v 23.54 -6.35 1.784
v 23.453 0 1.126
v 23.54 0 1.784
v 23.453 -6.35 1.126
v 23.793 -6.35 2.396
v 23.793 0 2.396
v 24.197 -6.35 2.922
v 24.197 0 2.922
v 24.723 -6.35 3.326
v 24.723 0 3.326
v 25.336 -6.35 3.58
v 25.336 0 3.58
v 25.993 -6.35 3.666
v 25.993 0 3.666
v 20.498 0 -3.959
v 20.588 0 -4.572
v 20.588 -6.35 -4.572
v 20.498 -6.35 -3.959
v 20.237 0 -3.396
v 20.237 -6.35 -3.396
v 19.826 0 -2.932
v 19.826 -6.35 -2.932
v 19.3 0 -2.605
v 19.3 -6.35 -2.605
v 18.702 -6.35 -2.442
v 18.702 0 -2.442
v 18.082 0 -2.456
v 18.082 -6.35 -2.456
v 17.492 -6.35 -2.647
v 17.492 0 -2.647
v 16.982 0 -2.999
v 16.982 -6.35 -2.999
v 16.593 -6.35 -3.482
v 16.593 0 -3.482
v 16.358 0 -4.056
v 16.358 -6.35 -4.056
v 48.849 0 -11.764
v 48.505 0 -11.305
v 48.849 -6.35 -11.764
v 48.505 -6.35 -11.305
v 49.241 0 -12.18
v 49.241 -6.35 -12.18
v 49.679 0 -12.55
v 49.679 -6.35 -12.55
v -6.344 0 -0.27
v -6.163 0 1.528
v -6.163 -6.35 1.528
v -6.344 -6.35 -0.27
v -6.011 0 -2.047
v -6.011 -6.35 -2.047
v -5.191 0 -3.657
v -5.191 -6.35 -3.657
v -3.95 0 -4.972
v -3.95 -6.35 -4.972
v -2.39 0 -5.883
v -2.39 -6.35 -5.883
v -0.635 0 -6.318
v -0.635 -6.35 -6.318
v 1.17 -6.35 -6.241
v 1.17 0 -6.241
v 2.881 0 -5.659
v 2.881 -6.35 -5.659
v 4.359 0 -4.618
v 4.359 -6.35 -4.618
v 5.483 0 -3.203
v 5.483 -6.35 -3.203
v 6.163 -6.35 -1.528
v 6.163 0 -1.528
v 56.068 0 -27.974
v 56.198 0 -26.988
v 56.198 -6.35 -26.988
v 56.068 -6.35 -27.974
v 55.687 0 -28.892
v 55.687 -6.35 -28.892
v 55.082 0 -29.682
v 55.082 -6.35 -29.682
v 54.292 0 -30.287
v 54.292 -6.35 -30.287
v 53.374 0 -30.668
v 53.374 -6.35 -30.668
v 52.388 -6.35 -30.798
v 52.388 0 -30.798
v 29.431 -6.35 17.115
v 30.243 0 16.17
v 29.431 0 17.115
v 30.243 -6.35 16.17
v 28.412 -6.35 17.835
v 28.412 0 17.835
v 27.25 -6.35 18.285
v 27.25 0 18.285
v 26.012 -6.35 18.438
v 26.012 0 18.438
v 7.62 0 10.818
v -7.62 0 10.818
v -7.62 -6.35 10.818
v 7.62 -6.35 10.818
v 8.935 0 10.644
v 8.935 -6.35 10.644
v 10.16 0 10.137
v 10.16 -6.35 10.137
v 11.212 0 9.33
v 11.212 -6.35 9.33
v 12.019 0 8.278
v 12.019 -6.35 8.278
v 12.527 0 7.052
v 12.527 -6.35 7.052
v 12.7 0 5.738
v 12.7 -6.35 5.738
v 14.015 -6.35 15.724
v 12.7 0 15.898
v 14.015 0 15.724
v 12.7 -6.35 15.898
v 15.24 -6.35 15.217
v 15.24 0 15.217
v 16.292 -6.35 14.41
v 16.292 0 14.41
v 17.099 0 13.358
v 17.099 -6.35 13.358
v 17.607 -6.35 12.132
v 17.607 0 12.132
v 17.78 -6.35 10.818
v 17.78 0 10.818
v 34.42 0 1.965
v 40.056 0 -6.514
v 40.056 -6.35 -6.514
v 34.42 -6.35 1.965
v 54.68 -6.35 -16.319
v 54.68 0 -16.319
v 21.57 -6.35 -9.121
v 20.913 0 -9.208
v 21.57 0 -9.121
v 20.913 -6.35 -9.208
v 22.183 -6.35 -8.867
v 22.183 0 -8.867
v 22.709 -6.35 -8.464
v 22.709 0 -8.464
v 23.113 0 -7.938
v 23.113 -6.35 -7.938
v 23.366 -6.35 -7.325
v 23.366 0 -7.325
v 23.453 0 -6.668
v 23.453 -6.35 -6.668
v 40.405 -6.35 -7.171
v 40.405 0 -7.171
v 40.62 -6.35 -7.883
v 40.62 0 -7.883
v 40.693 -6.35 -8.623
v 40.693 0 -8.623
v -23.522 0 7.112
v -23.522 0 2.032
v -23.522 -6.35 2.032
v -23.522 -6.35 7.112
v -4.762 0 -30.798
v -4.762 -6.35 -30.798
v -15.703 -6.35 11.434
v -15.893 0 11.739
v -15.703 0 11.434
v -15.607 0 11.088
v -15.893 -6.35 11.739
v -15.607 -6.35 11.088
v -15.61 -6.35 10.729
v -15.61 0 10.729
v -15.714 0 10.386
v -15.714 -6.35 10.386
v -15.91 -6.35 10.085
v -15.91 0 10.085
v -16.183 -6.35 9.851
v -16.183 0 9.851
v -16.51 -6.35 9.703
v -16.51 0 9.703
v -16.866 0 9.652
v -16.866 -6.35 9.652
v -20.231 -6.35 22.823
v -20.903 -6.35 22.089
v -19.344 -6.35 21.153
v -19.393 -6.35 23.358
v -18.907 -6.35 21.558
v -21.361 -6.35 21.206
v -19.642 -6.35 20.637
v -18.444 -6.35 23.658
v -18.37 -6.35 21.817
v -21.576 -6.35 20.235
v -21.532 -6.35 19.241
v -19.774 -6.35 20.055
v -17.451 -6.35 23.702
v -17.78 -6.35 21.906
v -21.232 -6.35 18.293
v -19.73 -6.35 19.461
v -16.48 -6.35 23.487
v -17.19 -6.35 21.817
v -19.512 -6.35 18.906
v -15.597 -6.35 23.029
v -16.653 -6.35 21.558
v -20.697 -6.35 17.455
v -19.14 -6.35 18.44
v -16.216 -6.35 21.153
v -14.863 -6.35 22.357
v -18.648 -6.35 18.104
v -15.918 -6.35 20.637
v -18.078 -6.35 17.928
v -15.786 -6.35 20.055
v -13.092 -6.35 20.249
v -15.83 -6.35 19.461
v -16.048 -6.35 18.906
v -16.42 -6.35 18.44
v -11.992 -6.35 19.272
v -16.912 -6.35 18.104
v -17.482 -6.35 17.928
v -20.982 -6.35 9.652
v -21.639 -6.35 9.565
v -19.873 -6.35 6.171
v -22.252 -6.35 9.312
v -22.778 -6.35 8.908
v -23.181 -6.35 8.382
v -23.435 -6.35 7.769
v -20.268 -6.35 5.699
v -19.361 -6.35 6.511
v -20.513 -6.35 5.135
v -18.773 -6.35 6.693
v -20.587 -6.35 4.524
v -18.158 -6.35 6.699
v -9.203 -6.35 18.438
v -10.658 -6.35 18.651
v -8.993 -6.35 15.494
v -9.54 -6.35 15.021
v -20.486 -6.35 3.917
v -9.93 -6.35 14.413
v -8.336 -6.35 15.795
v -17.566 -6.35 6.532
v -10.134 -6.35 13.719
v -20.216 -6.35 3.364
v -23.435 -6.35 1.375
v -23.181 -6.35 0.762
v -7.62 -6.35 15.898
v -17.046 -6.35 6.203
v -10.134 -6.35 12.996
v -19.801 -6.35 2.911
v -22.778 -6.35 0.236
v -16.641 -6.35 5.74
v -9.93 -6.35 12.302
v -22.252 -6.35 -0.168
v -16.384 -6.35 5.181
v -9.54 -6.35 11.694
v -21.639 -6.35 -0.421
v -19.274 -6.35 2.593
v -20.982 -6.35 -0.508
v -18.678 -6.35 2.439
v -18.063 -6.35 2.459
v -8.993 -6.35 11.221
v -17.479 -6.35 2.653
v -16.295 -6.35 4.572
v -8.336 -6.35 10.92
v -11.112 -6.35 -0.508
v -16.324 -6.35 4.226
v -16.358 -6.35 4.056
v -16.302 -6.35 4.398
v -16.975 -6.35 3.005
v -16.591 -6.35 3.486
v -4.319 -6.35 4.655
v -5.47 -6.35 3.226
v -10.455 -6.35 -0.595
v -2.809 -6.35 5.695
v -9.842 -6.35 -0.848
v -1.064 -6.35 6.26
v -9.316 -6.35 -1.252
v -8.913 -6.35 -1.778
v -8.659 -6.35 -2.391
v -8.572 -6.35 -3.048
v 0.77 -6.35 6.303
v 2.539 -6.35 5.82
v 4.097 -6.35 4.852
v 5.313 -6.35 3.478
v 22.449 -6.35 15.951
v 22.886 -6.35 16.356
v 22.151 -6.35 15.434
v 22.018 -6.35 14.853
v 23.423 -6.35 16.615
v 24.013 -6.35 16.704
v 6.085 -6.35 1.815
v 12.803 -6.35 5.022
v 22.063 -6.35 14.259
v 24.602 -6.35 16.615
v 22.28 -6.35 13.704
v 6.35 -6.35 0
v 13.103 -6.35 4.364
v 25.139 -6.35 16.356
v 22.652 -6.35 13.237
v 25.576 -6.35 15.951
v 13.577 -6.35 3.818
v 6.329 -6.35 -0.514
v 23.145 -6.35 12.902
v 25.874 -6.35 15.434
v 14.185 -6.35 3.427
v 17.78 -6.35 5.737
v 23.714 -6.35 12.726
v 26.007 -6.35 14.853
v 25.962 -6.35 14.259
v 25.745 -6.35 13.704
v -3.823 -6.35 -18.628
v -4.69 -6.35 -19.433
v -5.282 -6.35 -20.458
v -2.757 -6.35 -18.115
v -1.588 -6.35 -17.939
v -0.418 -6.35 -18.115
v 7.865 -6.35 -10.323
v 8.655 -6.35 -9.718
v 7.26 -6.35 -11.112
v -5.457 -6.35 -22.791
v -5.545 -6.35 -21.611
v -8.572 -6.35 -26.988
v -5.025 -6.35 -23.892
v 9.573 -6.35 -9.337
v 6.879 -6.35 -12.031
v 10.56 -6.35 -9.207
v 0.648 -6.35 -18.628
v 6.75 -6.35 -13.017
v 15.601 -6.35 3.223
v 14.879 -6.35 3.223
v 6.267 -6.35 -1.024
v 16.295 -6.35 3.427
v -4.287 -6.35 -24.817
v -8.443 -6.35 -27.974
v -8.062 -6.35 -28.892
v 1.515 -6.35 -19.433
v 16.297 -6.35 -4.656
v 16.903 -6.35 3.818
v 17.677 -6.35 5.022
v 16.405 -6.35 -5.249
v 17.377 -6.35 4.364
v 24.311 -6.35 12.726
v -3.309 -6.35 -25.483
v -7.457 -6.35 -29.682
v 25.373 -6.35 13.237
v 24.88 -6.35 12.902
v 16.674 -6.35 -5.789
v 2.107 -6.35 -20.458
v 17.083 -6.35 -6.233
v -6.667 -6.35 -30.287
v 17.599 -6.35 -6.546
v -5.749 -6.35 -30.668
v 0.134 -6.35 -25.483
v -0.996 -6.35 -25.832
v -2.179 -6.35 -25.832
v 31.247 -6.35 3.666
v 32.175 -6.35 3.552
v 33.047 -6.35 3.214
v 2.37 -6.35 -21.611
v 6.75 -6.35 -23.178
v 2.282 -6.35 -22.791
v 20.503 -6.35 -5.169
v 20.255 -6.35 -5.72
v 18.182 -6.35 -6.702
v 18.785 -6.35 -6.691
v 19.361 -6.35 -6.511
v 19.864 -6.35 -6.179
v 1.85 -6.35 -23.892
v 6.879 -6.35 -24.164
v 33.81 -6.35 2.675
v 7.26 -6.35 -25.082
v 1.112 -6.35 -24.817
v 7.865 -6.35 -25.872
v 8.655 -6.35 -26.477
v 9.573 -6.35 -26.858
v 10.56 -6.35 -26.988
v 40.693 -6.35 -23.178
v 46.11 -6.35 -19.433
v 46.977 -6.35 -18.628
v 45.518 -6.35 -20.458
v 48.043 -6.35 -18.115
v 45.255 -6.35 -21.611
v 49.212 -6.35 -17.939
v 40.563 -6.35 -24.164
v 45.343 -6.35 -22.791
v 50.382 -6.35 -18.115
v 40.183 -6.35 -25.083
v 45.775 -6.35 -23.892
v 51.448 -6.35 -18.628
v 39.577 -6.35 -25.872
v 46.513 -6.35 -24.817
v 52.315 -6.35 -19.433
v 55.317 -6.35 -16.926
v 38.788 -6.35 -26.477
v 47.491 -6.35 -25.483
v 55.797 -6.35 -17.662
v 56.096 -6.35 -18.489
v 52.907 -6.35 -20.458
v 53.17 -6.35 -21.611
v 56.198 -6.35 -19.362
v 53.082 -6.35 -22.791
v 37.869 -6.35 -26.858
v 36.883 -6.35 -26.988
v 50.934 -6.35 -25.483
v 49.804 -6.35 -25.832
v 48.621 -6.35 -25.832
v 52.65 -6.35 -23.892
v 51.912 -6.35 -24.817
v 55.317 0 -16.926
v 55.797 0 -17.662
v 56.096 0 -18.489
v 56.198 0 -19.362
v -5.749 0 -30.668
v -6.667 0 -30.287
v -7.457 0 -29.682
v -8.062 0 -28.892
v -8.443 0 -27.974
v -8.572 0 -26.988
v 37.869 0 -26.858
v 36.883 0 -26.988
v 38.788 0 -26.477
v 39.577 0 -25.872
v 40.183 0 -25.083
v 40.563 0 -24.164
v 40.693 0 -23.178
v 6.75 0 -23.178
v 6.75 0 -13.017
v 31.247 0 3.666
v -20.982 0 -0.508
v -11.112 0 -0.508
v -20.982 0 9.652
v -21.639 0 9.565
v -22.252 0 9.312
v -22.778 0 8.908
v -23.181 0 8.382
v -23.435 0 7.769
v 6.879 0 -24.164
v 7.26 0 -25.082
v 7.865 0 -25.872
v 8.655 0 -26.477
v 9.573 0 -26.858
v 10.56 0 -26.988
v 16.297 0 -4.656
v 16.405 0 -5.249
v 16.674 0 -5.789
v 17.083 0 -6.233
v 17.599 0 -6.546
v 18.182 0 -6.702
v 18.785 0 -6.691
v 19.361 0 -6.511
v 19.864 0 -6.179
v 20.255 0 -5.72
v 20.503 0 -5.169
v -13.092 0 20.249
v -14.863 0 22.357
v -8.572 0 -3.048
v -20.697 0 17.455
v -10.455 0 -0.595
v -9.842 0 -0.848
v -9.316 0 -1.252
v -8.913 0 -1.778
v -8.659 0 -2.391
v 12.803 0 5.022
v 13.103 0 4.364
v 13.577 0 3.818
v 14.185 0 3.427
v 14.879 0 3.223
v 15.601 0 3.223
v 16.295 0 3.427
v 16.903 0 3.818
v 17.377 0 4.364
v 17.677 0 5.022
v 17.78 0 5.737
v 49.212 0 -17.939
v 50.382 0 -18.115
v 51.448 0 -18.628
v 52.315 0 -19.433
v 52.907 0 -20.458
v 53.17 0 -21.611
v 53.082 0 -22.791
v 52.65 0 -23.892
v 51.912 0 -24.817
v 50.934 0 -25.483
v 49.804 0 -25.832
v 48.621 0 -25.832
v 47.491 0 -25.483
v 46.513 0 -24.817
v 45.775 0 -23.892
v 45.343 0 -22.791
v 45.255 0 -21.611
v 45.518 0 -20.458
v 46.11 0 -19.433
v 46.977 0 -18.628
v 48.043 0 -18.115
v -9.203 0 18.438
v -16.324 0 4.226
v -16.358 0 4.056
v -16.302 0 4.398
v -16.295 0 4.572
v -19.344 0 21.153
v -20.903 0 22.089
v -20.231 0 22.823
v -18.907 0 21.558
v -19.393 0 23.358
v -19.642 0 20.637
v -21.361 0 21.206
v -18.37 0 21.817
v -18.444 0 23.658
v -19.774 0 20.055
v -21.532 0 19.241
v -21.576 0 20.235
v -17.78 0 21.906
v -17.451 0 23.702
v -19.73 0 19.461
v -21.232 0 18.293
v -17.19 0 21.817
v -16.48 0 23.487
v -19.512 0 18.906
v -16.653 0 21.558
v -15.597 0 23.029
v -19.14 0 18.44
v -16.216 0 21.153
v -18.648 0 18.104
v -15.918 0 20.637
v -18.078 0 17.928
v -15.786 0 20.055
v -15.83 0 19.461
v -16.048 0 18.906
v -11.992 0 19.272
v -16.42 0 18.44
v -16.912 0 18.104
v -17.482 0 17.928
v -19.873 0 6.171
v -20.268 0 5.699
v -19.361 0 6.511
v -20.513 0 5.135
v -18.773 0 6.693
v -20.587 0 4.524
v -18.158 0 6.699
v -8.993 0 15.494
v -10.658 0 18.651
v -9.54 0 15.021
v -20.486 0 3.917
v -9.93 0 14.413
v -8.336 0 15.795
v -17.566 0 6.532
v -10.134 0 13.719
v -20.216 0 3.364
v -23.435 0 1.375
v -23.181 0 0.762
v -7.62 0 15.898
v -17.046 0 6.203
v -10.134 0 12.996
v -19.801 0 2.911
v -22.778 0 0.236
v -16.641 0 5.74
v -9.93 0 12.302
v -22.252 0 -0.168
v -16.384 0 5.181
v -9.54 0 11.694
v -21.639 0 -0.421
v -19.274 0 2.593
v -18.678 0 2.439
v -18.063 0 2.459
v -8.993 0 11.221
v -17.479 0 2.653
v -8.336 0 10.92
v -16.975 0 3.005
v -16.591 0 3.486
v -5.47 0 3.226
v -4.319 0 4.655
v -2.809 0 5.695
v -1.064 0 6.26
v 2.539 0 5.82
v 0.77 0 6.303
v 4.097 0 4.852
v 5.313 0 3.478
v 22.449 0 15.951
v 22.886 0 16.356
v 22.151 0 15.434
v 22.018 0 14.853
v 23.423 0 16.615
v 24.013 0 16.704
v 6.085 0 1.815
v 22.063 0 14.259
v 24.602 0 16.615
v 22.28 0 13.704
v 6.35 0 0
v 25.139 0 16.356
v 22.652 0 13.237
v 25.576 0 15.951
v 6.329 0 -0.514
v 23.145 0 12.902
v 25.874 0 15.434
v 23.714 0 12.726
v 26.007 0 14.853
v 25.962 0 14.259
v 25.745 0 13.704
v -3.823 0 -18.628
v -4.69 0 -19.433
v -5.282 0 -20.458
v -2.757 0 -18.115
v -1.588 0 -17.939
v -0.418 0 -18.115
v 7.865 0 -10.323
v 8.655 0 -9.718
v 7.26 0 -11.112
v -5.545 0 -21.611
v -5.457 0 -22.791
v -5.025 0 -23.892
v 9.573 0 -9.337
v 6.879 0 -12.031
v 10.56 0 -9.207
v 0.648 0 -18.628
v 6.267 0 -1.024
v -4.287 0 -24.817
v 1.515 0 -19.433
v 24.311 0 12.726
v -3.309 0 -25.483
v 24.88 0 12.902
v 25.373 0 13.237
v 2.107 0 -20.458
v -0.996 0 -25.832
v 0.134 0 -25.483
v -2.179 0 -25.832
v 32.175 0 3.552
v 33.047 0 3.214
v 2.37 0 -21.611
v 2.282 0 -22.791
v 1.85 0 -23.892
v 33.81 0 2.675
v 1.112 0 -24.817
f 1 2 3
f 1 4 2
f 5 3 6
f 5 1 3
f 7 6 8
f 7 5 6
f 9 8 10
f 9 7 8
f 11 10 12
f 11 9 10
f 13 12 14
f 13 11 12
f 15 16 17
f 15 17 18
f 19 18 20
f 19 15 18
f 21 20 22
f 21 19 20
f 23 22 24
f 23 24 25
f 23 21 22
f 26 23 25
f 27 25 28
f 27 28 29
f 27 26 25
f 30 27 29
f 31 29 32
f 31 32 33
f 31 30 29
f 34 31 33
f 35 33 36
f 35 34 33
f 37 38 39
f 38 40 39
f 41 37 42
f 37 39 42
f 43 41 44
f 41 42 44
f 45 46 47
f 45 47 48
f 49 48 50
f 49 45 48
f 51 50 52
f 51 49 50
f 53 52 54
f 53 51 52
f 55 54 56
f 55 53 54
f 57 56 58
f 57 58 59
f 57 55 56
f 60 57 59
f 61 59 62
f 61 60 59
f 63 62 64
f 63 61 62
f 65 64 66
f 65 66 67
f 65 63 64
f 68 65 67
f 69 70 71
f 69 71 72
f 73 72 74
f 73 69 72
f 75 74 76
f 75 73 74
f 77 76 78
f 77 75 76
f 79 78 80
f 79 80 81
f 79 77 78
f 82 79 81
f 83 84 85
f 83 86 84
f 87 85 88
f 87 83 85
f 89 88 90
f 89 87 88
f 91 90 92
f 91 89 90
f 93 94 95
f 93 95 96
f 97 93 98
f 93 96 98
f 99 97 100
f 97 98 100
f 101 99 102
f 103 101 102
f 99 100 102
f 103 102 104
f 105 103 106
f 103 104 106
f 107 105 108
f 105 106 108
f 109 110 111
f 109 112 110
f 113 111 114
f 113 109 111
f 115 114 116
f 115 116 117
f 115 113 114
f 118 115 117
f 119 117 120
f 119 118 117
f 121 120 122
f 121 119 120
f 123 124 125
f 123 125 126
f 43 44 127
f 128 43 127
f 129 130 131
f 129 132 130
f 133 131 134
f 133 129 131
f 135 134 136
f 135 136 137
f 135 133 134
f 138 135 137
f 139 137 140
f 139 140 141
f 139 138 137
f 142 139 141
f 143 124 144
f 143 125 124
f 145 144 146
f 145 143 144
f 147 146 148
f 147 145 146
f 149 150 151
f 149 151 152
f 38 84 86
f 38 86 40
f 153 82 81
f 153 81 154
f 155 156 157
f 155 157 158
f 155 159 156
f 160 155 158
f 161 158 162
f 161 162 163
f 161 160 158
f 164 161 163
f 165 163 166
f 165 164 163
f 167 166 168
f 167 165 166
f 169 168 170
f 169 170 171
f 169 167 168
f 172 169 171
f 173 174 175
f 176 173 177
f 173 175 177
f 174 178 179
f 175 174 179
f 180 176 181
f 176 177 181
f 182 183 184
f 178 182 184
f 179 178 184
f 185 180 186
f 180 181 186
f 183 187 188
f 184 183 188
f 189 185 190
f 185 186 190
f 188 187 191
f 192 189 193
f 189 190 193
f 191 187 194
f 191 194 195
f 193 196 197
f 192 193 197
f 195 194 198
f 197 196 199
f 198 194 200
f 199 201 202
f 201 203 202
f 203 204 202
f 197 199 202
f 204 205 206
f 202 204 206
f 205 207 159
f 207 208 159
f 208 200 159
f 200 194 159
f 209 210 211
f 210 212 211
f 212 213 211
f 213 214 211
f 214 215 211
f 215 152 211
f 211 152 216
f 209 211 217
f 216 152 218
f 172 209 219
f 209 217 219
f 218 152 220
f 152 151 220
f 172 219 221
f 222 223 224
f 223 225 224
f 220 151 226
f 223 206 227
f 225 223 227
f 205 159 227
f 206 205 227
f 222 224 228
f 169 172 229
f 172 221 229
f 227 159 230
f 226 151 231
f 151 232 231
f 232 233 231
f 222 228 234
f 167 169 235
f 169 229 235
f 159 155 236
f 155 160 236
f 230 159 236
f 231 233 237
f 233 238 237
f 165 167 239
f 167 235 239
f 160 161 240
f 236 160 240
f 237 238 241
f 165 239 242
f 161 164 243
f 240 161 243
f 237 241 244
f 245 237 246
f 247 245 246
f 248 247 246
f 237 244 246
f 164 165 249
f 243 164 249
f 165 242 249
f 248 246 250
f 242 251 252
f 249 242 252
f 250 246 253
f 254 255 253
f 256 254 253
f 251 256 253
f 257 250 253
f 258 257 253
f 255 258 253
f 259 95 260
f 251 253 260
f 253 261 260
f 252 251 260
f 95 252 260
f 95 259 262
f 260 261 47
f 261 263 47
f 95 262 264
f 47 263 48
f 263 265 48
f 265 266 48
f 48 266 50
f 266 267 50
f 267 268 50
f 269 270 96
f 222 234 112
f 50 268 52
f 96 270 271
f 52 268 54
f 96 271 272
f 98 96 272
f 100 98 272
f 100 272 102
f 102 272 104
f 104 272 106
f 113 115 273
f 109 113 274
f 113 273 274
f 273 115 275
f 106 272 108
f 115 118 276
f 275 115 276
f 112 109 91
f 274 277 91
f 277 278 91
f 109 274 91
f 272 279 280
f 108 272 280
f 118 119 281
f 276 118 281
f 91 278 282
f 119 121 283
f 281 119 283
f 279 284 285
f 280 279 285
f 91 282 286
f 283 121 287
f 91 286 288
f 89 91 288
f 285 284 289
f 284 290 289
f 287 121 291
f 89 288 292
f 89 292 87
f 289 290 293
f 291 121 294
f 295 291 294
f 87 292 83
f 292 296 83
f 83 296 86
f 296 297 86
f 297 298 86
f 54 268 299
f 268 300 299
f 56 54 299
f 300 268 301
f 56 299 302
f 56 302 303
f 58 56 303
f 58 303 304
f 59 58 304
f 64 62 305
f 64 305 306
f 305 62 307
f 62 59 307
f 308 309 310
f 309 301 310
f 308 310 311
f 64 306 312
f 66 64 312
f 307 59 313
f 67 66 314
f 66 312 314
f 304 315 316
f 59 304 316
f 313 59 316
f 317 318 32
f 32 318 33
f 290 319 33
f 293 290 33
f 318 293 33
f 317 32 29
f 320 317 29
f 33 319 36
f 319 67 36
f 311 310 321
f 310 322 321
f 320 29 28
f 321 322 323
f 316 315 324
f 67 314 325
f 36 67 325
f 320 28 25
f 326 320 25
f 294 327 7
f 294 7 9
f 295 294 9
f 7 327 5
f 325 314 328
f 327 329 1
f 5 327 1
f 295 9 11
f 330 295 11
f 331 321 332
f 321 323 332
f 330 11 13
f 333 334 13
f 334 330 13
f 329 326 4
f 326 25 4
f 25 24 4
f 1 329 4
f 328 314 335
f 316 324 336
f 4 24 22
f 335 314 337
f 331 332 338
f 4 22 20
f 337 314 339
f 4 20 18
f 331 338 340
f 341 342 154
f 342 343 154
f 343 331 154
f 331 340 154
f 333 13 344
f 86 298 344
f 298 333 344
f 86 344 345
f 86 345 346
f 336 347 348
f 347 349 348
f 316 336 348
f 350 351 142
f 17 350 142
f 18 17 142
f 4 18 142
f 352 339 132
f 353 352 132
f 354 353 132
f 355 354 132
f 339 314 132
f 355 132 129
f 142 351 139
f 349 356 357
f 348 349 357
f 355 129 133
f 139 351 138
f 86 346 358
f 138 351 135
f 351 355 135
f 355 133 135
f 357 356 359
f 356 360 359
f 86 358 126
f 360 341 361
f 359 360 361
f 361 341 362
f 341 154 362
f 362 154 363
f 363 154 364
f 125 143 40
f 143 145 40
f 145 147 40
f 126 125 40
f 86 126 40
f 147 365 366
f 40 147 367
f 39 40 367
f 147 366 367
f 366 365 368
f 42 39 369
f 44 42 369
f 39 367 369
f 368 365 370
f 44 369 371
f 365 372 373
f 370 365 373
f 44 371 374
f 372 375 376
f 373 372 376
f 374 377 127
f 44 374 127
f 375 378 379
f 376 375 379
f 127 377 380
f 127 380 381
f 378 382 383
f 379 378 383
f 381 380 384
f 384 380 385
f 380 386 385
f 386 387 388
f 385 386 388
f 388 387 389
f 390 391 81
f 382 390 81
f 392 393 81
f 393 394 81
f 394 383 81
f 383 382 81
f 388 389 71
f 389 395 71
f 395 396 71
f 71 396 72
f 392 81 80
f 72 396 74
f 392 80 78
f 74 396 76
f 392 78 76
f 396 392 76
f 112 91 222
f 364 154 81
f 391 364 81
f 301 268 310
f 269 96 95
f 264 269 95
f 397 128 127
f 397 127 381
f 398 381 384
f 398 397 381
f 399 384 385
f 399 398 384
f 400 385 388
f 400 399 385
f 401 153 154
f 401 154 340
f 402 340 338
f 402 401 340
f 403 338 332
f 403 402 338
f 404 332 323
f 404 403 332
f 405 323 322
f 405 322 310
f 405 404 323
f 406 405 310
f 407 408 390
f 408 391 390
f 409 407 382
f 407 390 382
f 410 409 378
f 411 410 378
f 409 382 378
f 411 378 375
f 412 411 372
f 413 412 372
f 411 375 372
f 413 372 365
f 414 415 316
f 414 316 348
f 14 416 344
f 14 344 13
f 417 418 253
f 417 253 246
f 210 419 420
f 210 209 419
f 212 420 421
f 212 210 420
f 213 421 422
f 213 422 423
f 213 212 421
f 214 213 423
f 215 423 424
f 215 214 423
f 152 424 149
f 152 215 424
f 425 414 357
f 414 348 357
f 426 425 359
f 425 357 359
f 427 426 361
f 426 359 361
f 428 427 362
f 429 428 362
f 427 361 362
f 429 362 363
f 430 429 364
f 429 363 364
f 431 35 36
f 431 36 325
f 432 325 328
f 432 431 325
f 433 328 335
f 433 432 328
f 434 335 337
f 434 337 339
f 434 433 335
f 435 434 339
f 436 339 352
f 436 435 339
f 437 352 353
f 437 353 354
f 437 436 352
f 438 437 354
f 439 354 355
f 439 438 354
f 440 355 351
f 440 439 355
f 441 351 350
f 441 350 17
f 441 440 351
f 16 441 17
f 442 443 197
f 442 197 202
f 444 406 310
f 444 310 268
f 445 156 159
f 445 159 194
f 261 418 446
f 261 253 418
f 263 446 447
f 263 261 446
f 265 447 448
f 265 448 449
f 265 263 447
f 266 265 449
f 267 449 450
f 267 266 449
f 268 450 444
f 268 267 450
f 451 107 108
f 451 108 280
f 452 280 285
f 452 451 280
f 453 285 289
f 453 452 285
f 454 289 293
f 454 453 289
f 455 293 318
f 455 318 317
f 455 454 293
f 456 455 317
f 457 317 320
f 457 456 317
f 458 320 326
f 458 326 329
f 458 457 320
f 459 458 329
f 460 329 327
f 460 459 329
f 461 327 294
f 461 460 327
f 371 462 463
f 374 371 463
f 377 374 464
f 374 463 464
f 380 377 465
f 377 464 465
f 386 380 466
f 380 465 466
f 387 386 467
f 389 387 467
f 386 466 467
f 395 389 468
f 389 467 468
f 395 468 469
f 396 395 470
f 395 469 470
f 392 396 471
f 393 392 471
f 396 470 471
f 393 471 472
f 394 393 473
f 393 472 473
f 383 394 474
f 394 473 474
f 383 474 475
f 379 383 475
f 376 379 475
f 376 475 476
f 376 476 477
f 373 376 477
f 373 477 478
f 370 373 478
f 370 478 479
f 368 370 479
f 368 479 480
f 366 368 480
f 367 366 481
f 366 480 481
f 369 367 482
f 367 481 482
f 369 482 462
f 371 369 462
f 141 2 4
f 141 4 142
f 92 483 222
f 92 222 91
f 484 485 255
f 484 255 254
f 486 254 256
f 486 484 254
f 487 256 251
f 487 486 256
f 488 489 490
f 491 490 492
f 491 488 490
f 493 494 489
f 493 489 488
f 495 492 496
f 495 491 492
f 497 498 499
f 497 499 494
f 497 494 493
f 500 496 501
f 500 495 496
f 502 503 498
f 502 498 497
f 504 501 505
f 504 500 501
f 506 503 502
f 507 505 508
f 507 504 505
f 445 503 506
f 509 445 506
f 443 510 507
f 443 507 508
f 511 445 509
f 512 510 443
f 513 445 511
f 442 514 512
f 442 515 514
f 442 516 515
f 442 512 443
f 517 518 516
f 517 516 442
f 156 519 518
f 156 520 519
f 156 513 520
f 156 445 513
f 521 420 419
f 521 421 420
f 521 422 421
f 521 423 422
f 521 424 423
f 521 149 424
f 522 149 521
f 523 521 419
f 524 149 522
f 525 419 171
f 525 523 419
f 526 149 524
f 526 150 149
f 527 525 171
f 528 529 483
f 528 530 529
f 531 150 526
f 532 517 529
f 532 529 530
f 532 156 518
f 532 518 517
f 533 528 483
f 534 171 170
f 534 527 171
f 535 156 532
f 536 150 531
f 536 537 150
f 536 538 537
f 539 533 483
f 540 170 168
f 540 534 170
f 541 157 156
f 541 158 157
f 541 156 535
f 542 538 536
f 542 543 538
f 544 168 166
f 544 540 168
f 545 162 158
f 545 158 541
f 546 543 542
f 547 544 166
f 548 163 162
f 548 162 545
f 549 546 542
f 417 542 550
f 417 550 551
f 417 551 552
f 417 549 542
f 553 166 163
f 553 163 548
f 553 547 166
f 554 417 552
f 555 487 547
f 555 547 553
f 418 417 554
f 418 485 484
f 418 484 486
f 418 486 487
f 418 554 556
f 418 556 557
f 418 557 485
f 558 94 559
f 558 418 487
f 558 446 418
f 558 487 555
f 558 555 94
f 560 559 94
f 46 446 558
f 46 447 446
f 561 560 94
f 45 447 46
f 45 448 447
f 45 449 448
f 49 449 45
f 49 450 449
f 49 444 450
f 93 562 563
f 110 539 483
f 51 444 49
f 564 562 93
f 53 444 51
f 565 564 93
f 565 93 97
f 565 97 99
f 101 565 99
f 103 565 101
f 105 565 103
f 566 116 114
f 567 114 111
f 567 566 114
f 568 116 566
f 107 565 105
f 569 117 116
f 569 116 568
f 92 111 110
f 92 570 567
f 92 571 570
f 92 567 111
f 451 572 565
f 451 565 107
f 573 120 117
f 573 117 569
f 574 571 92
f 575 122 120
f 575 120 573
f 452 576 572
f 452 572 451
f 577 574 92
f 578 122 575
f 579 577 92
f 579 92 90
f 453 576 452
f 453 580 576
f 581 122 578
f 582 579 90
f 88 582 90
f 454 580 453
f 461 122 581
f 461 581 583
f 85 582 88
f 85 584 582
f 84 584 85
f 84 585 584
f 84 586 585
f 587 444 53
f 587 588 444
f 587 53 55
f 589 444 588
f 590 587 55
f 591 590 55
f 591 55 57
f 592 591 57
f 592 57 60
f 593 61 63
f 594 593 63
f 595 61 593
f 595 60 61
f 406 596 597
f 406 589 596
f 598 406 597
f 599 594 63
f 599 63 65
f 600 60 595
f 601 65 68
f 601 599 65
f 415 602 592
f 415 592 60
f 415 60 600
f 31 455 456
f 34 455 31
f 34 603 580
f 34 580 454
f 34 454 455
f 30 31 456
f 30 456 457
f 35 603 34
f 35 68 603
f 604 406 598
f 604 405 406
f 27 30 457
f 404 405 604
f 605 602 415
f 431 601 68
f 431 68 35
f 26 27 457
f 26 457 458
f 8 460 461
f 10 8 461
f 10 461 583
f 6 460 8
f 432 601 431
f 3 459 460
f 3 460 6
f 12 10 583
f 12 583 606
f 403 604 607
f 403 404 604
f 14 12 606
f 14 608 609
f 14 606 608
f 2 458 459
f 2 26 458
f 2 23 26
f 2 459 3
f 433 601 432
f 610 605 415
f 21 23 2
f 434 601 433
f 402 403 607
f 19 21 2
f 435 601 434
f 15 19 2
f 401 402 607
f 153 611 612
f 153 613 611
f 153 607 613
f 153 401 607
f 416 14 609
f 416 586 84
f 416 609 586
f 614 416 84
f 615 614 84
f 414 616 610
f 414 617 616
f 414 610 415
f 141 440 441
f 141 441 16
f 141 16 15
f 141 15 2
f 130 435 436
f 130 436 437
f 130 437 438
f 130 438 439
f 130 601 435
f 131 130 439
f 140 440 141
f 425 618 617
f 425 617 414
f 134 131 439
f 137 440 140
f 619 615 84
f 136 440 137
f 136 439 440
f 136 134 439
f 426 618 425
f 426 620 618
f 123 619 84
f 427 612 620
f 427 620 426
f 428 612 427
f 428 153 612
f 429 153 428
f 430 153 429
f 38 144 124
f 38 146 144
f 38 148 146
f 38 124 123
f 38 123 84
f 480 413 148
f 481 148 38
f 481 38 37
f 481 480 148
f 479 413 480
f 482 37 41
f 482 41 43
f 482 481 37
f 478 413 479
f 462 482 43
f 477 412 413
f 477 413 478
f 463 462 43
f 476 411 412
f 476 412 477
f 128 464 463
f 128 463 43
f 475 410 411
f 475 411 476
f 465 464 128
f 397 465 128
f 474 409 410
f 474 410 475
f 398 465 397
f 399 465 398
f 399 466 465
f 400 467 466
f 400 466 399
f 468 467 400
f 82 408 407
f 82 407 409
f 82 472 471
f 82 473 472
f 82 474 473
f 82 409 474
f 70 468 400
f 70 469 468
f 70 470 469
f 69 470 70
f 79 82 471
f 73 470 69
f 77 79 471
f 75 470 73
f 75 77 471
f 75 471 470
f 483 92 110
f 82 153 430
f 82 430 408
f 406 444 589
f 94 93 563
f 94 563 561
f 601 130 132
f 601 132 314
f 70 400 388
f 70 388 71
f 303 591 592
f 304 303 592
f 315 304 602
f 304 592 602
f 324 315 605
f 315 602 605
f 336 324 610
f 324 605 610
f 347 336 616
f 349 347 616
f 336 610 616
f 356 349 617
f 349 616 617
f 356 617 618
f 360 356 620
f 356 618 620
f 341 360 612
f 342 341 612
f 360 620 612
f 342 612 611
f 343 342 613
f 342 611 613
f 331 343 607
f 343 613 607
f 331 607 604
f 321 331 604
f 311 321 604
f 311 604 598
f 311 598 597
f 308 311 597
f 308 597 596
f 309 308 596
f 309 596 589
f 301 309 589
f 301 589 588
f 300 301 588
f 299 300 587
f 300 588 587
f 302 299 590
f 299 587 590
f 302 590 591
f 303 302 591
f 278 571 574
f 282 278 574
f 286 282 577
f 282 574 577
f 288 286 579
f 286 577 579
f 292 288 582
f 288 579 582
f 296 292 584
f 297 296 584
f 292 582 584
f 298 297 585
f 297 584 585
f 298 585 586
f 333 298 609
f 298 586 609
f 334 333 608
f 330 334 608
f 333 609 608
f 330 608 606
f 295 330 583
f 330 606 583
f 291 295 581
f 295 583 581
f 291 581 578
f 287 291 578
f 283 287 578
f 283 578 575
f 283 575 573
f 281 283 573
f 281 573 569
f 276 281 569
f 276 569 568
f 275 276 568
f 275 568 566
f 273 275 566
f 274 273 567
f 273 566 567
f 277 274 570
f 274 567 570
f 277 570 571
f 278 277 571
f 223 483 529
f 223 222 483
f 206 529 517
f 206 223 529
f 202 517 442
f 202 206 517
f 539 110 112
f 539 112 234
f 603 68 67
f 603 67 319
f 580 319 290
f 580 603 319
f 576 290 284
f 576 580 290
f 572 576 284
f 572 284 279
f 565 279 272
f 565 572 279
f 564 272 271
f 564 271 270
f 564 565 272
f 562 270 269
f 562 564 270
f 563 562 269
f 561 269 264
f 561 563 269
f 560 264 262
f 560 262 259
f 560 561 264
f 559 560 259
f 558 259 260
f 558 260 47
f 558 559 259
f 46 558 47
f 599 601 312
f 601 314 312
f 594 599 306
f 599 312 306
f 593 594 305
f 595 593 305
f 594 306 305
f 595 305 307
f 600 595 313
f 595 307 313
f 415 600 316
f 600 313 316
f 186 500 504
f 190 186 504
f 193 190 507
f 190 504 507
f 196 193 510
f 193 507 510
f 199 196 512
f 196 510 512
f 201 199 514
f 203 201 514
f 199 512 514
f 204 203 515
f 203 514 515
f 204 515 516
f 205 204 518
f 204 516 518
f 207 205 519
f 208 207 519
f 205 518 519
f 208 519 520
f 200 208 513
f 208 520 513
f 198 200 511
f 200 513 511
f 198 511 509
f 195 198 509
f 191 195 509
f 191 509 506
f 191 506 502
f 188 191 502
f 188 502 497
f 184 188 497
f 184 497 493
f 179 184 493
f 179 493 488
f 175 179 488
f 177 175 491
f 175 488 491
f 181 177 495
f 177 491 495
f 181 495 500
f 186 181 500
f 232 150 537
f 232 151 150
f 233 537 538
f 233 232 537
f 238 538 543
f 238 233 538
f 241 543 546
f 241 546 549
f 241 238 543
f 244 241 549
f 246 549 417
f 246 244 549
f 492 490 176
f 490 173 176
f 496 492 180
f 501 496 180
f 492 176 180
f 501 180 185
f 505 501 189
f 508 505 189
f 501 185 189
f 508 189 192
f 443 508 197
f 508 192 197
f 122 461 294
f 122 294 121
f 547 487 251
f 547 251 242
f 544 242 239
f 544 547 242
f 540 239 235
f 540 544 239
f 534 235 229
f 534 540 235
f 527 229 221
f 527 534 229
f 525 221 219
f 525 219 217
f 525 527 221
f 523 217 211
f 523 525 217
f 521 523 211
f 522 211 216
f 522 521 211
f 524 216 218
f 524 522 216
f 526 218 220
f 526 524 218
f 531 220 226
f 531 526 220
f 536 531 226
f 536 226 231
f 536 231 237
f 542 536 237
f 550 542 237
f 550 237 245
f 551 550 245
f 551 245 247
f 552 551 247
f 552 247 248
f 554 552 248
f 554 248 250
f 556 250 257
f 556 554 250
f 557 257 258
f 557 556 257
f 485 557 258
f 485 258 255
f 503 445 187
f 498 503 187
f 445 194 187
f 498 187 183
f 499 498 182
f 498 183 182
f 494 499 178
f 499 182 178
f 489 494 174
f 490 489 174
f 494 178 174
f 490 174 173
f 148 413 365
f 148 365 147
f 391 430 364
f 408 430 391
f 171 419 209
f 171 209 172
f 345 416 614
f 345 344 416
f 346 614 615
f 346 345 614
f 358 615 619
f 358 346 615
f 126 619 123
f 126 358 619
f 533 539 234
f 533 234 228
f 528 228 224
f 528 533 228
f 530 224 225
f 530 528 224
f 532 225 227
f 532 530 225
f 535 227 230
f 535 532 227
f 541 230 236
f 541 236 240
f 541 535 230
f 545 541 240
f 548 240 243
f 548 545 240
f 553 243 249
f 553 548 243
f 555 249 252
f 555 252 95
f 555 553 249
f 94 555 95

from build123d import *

# Parameters (mm, degrees)
SKETCH4_R           = 2
SKETCH4_R_2         = 3.96875
BOSS_EXTRUDE2_DEPTH = 6.35
FILLET1_R           = 5.08
FILLET7_R           = 3.81
FILLET9_R           = 5.08
FILLET10_R          = 1.27
FILLET11_R          = 3.81
FILLET12_R          = 2.54
FILLET13_R          = 3.81


with BuildPart() as part:
    # Sketch4 → Boss-Extrude2 (new body)
    with BuildSketch(Plane(origin=(0, 0, 0), x_dir=(1, 0, 0), z_dir=(0, 1, 0))):
        with BuildLine():
            Line((22.483900583, -18.4375), (28.735494078, -18.4375))
            Line((28.735494078, -18.4375), (48.985566477, 12.027918285))
            Line((48.985566477, 12.027918285), (54.680415238, 16.319294633))
            ThreePointArc((54.680415238, 16.319294633), (55.797199918, 17.662082259), (56.1975, 19.362095927))
            Line((56.1975, 19.362095927), (56.1975, 26.9875))
            ThreePointArc((56.1975, 26.9875), (55.081576836, 29.681576836), (52.3875, 30.7975))
            Line((52.3875, 30.7975), (-4.7625, 30.7975))
            ThreePointArc((-4.7625, 30.7975), (-7.456576836, 29.681576836), (-8.5725, 26.9875))
            Line((-8.5725, 26.9875), (-8.5725, 12.607500122))
            Line((-8.5725, 12.607500122), (-8.5725, 0.508))
            Line((-8.5725, 0.508), (-23.52171402, 0.508))
            Line((-23.52171402, 0.508), (-23.52171402, -9.652))
            Line((-23.52171402, -9.652), (-14.139296969, -9.652))
            Line((-14.139296969, -9.652), (-23.148009155, -20.371437257))
            Line((-23.148009155, -20.371437257), (-17.314513469, -25.273959881))
            Line((-17.314513469, -25.273959881), (-11.569090649, -18.4375))
            Line((-11.569090649, -18.4375), (22.483900583, -18.4375))
        make_face()
        with Locations(Location((-17.78, -19.905950726, 0), (0, 0, 270))):
            Circle(SKETCH4_R, mode=Mode.SUBTRACT)
        with BuildLine():
            ThreePointArc((-16.29541402, -4.572), (-20.572189245, -4.832151892), (-16.358479767, -4.055532442))
            ThreePointArc((-16.358479767, -4.055532442), (-16.311238795, -4.311848108), (-16.29541402, -4.572))
        make_face(mode=Mode.SUBTRACT)
        with BuildLine():
            ThreePointArc((-7.62, -15.8975), (-10.16, -13.3575), (-7.62, -10.8175))
            Line((-7.62, -10.8175), (12.7, -10.8175))
            Line((12.7, -10.8175), (12.7, -5.7375))
            ThreePointArc((12.7, -5.7375), (15.24, -3.1975), (17.78, -5.7375))
            Line((17.78, -5.7375), (17.78, -13.3575))
            Line((17.78, -13.3575), (17.78, -15.8975))
            Line((17.78, -15.8975), (15.24, -15.8975))
            Line((15.24, -15.8975), (-7.62, -15.8975))
        make_face(mode=Mode.SUBTRACT)
        with BuildLine():
            ThreePointArc((-6.163414949, -1.528010526), (-1.528010526, 6.163414949), (6.163414949, 1.528010526))
            ThreePointArc((6.163414949, 1.528010526), (6.303181138, 0.769680153), (6.35, 0))
            ThreePointArc((6.35, 0), (0.769680153, -6.303181138), (-6.163414949, -1.528010526))
        make_face(mode=Mode.SUBTRACT)
        with Locations(Location((24.012521227, -14.703599027, 0), (0, 0, 270))):
            Circle(SKETCH4_R, mode=Mode.SUBTRACT)
        with Locations(Location((-1.5875, 21.9075, 0), (0, 0, 270))):
            Circle(SKETCH4_R_2, mode=Mode.SUBTRACT)
        with BuildLine():
            ThreePointArc((20.58801402, 4.572), (18.701865912, 2.441524775), (16.358479767, 4.055532442))
            ThreePointArc((16.358479767, 4.055532442), (18.181562129, 6.702475225), (20.58801402, 4.572))
        make_face(mode=Mode.SUBTRACT)
        Polygon((6.749565973, 9.2075), (6.749565973, 26.9875), (40.692955064, 26.9875), (40.692955064, 7.472580753), (33.28904903, -3.666297657), (23.452955064, -3.666297657), (23.452955064, 9.2075), align=None, mode=Mode.SUBTRACT)
        with Locations(Location((49.2125, 21.9075, 0), (0, 0, 270))):
            Circle(SKETCH4_R_2, mode=Mode.SUBTRACT)
    extrude(amount=-BOSS_EXTRUDE2_DEPTH)

    # Fillet1
    fillet1_edges = [part.edges().sort_by_distance(p)[0] for p in [
        (48.985566477, -3.175, -12.027918285),
        (28.735494078, -3.175, 18.4375),
    ]]
    fillet(fillet1_edges, radius=FILLET1_R)

    # Fillet7
    fillet7_edges = [part.edges().sort_by_distance(p)[0] for p in [
        (40.692955064, -3.175, -7.472580753),
        (40.692955064, -3.175, -26.9875),
        (6.749565973, -3.175, -26.9875),
        (6.749565973, -3.175, -9.2075),
    ]]
    fillet(fillet7_edges, radius=FILLET7_R)

    # Fillet9
    fillet9_edges = [part.edges().sort_by_distance(p)[0] for p in [
        (-11.569090649, -3.175, 18.4375),
        (12.7, -3.175, 10.8175),
        (17.78, -3.175, 15.8975),
    ]]
    fillet(fillet9_edges, radius=FILLET9_R - 0.0001)  # a hair under: the kernel refuses the full size

    # Fillet10
    fillet10_edges = [part.edges().sort_by_distance(p)[0] for p in [
        (-14.139296969, -3.175, 9.652),
    ]]
    fillet(fillet10_edges, radius=FILLET10_R)

    # Fillet11
    fillet11_edges = [part.edges().sort_by_distance(p)[0] for p in [
        (-17.314513469, -3.175, 25.273959881),
        (-23.148009155, -3.175, 20.371437257),
    ]]
    fillet(fillet11_edges, radius=FILLET11_R - 0.0001)  # a hair under: the kernel refuses the full size

    # Fillet12
    fillet12_edges = [part.edges().sort_by_distance(p)[0] for p in [
        (23.452955064, -3.175, -9.2075),
        (23.452955064, -3.175, 3.666297657),
        (-23.52171402, -3.175, 9.652),
        (-23.52171402, -3.175, -0.508),
        (-8.5725, -3.175, -0.508),
    ]]
    fillet(fillet12_edges, radius=FILLET12_R)

    # Fillet13
    fillet13_edges = [part.edges().sort_by_distance(p)[0] for p in [
        (33.28904903, -3.175, 3.666297657),
    ]]
    fillet(fillet13_edges, radius=FILLET13_R)


solid = part.part
